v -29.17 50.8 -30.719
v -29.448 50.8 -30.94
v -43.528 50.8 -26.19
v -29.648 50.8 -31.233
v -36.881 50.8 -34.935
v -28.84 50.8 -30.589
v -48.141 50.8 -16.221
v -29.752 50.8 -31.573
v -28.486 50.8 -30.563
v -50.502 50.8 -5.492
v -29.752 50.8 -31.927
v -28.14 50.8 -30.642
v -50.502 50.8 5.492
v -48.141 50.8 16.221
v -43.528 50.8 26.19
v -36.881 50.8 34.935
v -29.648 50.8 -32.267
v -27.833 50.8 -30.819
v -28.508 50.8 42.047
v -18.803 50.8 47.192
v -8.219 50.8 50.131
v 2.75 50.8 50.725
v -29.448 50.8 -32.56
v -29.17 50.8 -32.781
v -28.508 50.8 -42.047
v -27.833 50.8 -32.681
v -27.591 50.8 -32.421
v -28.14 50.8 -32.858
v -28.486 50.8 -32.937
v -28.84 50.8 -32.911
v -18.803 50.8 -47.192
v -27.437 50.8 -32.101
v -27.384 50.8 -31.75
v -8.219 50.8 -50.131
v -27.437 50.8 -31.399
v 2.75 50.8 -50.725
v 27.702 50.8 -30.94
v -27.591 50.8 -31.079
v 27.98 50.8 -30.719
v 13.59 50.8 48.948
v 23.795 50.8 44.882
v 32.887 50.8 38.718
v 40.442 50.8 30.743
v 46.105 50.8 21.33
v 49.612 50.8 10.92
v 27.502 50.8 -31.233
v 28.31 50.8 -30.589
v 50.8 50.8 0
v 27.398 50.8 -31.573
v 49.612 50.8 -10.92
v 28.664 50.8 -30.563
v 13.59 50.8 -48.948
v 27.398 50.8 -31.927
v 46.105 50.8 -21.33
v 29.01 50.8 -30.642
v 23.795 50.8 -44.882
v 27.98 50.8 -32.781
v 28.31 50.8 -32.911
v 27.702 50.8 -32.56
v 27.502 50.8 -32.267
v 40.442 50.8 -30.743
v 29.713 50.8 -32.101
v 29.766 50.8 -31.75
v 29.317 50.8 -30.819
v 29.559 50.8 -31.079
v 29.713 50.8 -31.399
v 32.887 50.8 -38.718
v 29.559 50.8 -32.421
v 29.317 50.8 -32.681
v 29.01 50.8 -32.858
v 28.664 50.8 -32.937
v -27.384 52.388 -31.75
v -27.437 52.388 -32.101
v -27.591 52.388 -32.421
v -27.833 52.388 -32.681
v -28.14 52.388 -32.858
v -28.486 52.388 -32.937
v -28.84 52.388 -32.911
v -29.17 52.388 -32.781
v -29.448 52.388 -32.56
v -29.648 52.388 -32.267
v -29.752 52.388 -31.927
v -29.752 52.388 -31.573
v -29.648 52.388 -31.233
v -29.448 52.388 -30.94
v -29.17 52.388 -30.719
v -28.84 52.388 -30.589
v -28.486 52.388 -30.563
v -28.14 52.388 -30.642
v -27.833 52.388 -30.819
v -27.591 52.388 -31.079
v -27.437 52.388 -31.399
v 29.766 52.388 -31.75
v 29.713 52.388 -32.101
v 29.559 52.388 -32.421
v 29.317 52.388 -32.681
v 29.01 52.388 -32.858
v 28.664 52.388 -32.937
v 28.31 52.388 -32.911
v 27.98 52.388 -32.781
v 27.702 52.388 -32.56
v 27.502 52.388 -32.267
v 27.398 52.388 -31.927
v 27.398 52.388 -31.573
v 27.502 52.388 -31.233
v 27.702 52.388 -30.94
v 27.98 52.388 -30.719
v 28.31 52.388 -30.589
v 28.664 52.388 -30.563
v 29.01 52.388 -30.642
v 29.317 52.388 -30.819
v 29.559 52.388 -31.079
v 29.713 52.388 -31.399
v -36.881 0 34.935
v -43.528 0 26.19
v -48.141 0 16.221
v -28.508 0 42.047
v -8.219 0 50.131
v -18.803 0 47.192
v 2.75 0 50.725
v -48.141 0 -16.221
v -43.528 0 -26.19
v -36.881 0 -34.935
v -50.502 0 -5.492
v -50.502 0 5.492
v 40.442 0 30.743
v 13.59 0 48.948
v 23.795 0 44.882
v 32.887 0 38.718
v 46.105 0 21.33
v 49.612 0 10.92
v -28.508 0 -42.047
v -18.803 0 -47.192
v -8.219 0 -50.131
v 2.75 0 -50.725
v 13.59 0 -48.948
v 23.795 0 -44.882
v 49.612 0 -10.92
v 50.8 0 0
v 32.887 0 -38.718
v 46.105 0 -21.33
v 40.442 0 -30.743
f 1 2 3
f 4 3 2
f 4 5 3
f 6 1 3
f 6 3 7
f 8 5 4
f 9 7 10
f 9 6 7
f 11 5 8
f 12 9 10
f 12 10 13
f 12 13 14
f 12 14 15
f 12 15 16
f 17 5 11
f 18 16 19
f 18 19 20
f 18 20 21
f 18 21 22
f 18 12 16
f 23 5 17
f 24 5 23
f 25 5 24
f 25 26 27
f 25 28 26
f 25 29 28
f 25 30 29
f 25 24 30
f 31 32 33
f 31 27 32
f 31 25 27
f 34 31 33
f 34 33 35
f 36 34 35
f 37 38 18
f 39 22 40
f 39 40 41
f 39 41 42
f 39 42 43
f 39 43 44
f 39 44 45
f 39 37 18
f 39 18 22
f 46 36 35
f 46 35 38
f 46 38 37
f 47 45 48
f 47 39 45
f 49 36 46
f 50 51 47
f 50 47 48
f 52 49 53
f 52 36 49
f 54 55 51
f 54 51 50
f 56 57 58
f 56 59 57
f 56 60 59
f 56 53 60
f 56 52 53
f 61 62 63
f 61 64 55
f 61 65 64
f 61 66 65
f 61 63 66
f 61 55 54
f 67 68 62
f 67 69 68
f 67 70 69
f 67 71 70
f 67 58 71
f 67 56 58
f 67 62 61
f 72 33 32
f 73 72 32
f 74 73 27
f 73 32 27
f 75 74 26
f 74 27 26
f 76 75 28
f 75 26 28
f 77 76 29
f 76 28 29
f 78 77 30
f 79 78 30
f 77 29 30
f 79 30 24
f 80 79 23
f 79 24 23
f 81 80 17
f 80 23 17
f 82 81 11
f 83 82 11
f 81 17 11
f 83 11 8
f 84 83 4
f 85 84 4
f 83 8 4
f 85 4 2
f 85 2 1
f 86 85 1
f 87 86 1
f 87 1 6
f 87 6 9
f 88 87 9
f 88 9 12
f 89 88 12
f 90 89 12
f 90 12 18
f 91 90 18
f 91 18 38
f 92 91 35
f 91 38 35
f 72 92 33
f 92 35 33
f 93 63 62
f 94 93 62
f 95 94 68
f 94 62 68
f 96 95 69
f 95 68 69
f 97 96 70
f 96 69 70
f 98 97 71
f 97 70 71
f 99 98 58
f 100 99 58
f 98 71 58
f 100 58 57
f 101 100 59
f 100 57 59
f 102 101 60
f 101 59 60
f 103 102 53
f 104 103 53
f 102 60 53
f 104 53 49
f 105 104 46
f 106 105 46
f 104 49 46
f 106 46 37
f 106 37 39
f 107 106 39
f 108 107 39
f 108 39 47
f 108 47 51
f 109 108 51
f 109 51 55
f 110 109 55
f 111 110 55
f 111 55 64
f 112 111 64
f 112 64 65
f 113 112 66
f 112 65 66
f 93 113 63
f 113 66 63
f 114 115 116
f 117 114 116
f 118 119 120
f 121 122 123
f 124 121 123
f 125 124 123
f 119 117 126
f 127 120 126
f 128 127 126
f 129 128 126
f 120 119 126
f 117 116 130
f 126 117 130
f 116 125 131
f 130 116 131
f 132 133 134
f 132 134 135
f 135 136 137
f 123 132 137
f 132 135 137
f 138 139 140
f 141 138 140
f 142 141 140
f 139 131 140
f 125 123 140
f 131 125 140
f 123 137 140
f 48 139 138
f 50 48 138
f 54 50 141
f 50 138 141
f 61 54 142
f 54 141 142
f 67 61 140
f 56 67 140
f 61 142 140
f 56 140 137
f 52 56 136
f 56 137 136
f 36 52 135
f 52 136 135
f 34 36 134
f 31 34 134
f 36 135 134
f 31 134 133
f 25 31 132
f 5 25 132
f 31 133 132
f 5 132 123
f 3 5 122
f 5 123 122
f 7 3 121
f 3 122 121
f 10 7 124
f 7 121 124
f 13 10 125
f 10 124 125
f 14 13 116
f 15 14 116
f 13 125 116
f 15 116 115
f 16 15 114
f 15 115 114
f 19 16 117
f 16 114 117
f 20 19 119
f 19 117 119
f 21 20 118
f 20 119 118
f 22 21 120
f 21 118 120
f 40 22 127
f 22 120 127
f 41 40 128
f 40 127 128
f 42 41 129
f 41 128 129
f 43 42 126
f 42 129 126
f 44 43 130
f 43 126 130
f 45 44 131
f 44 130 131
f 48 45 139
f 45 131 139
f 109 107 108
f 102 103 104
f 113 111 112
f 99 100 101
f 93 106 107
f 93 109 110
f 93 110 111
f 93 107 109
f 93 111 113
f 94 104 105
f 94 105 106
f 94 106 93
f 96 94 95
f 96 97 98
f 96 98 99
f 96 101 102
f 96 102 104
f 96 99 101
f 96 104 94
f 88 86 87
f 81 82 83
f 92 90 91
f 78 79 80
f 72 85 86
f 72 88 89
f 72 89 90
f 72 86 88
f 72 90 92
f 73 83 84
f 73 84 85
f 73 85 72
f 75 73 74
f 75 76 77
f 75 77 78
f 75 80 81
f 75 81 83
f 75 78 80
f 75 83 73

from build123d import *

# Parameters (mm, degrees)
SKETCH1_R           = 50.8
BOSS_EXTRUDE1_DEPTH = 50.8
SKETCH3_R           = 1.190625
BOSS_EXTRUDE3_DEPTH = 1.588262


with BuildPart() as part:
    # Sketch1 → Boss-Extrude1 (new body)
    with BuildSketch(Plane(origin=(0, 0, 0), x_dir=(1, 0, 0), z_dir=(0, 1, 0))):
        Circle(SKETCH1_R)
    extrude(amount=BOSS_EXTRUDE1_DEPTH)

    # Sketch3 → Boss-Extrude3 (add)
    with BuildSketch(Plane(origin=(0, 50.8, 0), x_dir=(1, 0, 0), z_dir=(0, 1, 0))):
        with Locations((28.575, 31.75)):
            Circle(SKETCH3_R)
        with Locations((-28.575, 31.75)):
            Circle(SKETCH3_R)
    extrude(amount=BOSS_EXTRUDE3_DEPTH)


solid = part.part
